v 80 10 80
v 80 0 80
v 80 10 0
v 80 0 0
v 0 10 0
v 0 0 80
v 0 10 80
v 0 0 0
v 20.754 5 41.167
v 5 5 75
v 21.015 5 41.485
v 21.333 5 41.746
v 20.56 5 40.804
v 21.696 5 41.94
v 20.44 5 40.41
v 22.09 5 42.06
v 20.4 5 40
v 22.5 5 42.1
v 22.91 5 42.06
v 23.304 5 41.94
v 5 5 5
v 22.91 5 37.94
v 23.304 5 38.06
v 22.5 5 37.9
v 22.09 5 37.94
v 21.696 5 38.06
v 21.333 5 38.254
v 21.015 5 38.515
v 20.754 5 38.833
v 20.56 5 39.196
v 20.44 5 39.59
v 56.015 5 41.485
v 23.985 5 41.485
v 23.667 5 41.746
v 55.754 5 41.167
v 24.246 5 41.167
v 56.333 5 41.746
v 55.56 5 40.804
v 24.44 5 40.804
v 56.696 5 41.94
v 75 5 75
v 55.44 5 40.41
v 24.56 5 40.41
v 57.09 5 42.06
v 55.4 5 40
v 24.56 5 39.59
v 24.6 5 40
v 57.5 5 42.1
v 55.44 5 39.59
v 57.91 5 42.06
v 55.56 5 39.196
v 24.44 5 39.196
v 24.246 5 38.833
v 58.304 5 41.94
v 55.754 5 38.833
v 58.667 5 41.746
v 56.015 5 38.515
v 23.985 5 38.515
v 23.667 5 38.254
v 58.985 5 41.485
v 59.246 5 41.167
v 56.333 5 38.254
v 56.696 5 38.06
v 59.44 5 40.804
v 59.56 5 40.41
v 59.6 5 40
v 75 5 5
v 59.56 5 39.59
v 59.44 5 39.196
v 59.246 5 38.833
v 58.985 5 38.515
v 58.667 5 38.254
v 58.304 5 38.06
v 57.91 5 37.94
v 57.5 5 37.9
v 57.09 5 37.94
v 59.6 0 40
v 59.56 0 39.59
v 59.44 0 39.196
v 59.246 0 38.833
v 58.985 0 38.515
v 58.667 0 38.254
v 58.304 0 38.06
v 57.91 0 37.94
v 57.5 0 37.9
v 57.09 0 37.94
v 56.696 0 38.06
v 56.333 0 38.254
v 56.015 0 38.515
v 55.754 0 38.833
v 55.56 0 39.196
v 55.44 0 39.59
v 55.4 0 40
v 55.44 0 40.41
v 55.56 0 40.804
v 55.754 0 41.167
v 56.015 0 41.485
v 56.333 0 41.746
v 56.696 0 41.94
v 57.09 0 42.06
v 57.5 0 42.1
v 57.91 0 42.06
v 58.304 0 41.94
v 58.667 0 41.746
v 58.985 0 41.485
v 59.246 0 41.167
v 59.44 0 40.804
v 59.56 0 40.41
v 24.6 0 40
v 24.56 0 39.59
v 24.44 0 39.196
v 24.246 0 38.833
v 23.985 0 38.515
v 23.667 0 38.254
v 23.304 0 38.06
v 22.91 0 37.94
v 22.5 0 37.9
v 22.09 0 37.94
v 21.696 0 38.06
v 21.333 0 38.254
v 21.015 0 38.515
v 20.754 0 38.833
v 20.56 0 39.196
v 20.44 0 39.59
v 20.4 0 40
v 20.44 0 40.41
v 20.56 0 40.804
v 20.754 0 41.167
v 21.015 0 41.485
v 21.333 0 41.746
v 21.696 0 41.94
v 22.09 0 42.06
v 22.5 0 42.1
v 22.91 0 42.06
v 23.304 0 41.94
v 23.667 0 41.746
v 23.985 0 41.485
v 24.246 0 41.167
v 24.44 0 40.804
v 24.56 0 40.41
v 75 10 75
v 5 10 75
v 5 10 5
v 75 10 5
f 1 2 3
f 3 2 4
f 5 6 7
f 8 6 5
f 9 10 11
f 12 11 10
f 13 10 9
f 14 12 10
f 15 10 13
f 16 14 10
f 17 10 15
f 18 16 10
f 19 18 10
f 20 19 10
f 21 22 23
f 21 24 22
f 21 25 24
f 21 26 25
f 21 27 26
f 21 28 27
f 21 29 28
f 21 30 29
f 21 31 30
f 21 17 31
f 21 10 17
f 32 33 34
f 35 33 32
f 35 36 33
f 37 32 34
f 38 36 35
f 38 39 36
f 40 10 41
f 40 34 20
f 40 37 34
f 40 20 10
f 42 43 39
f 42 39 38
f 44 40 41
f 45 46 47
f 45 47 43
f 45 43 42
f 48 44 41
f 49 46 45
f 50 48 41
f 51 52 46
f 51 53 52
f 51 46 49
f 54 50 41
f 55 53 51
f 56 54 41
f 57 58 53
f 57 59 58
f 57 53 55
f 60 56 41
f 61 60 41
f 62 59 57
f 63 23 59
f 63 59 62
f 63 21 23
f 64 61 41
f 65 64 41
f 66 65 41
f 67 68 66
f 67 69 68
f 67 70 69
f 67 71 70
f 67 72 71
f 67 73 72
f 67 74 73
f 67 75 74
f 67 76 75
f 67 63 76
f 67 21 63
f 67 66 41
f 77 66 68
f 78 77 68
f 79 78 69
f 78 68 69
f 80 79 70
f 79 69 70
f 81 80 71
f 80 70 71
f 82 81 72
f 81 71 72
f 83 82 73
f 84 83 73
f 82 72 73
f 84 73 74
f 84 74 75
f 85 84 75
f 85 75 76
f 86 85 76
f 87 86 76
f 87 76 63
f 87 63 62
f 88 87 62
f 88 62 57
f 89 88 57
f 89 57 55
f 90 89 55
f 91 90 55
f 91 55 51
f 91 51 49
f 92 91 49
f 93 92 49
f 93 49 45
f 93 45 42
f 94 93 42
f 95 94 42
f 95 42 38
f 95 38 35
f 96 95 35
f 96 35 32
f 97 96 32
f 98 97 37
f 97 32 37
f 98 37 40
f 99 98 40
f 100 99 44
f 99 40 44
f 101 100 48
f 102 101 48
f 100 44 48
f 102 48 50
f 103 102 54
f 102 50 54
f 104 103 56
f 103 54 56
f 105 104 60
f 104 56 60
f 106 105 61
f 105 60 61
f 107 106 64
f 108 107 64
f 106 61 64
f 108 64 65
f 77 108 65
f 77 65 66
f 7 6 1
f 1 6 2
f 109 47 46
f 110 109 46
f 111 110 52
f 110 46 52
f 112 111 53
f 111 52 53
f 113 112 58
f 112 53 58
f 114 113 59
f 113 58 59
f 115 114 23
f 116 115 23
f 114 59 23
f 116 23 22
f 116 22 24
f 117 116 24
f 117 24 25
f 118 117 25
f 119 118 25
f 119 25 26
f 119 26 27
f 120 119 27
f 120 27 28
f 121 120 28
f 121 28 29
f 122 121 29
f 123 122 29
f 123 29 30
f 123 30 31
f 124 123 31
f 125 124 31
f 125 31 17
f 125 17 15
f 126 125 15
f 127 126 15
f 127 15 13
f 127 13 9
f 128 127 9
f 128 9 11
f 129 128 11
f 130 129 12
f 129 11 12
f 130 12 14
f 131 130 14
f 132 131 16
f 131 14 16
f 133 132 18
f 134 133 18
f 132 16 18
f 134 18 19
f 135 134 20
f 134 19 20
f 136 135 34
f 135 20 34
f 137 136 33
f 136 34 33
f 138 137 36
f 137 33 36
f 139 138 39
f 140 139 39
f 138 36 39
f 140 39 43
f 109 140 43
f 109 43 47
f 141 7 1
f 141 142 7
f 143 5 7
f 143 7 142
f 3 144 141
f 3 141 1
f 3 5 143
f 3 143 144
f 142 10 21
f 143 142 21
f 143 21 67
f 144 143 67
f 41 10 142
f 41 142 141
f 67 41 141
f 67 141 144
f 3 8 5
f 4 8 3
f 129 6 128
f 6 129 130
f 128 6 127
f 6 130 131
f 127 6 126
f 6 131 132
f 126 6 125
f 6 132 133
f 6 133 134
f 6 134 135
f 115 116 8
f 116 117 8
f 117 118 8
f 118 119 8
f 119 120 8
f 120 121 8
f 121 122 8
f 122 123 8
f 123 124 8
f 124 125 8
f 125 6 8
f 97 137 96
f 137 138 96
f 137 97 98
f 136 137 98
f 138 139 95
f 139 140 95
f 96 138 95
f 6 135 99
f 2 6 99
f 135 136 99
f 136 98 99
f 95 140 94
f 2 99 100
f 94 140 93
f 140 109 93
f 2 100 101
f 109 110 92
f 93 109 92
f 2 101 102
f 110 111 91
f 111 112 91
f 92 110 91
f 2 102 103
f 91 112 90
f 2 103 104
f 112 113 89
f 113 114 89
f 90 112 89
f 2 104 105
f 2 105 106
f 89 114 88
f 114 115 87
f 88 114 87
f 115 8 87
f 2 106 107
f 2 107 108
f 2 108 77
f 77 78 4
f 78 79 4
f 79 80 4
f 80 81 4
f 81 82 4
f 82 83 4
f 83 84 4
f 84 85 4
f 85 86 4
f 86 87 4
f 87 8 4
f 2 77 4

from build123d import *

# Parameters (mm, degrees)
SKETCH1_W           = 80
SKETCH1_H           = 80
BOSS_EXTRUDE1_DEPTH = 5
SKETCH2_W           = 80
SKETCH2_H           = 80
SKETCH2_W_2         = 70
SKETCH2_H_2         = 70
BOSS_EXTRUDE2_DEPTH = 5
CUT_EXTRUDE1_REACH  = 7
SKETCH3_R           = 2.1


with BuildPart() as part:
    # Sketch1 → Boss-Extrude1 (new body)
    with BuildSketch(Plane(origin=(0, 0, 0), x_dir=(1, 0, 0), z_dir=(0, 1, 0))):
        with Locations((40, -40)):
            Rectangle(SKETCH1_W, SKETCH1_H)
    extrude(amount=BOSS_EXTRUDE1_DEPTH)

    # Sketch2 → Boss-Extrude2 (add)
    with BuildSketch(Plane(origin=(0, 5, 0), x_dir=(1, 0, 0), z_dir=(0, 1, 0))):
        with Locations((40, -40)):
            Rectangle(SKETCH2_W, SKETCH2_H)
        with Locations((40, -40)):
            Rectangle(SKETCH2_W_2, SKETCH2_H_2, mode=Mode.SUBTRACT)
    extrude(amount=BOSS_EXTRUDE2_DEPTH)

    # Sketch3 → Cut-Extrude1 (cut, up to next)
    with BuildSketch(Plane(origin=(0, 5, 0), x_dir=(1, 0, 0), z_dir=(0, 1, 0)), mode=Mode.PRIVATE) as cut_extrude1_sk1:
        with Locations((22.5, -40)):
            Circle(SKETCH3_R)
    cut_extrude1_tool1 = extrude(cut_extrude1_sk1.sketch, amount=-CUT_EXTRUDE1_REACH, mode=Mode.PRIVATE) & part.part
    add(cut_extrude1_tool1.solids().sort_by_distance((22.5, 5, 40))[0], mode=Mode.SUBTRACT)
    # Sketch3 → Cut-Extrude1 (cut, up to next)
    with BuildSketch(Plane(origin=(0, 5, 0), x_dir=(1, 0, 0), z_dir=(0, 1, 0)), mode=Mode.PRIVATE) as cut_extrude1_sk2:
        with Locations((57.5, -40)):
            Circle(SKETCH3_R)
    cut_extrude1_tool2 = extrude(cut_extrude1_sk2.sketch, amount=-CUT_EXTRUDE1_REACH, mode=Mode.PRIVATE) & part.part
    add(cut_extrude1_tool2.solids().sort_by_distance((57.5, 5, 40))[0], mode=Mode.SUBTRACT)


solid = part.part
